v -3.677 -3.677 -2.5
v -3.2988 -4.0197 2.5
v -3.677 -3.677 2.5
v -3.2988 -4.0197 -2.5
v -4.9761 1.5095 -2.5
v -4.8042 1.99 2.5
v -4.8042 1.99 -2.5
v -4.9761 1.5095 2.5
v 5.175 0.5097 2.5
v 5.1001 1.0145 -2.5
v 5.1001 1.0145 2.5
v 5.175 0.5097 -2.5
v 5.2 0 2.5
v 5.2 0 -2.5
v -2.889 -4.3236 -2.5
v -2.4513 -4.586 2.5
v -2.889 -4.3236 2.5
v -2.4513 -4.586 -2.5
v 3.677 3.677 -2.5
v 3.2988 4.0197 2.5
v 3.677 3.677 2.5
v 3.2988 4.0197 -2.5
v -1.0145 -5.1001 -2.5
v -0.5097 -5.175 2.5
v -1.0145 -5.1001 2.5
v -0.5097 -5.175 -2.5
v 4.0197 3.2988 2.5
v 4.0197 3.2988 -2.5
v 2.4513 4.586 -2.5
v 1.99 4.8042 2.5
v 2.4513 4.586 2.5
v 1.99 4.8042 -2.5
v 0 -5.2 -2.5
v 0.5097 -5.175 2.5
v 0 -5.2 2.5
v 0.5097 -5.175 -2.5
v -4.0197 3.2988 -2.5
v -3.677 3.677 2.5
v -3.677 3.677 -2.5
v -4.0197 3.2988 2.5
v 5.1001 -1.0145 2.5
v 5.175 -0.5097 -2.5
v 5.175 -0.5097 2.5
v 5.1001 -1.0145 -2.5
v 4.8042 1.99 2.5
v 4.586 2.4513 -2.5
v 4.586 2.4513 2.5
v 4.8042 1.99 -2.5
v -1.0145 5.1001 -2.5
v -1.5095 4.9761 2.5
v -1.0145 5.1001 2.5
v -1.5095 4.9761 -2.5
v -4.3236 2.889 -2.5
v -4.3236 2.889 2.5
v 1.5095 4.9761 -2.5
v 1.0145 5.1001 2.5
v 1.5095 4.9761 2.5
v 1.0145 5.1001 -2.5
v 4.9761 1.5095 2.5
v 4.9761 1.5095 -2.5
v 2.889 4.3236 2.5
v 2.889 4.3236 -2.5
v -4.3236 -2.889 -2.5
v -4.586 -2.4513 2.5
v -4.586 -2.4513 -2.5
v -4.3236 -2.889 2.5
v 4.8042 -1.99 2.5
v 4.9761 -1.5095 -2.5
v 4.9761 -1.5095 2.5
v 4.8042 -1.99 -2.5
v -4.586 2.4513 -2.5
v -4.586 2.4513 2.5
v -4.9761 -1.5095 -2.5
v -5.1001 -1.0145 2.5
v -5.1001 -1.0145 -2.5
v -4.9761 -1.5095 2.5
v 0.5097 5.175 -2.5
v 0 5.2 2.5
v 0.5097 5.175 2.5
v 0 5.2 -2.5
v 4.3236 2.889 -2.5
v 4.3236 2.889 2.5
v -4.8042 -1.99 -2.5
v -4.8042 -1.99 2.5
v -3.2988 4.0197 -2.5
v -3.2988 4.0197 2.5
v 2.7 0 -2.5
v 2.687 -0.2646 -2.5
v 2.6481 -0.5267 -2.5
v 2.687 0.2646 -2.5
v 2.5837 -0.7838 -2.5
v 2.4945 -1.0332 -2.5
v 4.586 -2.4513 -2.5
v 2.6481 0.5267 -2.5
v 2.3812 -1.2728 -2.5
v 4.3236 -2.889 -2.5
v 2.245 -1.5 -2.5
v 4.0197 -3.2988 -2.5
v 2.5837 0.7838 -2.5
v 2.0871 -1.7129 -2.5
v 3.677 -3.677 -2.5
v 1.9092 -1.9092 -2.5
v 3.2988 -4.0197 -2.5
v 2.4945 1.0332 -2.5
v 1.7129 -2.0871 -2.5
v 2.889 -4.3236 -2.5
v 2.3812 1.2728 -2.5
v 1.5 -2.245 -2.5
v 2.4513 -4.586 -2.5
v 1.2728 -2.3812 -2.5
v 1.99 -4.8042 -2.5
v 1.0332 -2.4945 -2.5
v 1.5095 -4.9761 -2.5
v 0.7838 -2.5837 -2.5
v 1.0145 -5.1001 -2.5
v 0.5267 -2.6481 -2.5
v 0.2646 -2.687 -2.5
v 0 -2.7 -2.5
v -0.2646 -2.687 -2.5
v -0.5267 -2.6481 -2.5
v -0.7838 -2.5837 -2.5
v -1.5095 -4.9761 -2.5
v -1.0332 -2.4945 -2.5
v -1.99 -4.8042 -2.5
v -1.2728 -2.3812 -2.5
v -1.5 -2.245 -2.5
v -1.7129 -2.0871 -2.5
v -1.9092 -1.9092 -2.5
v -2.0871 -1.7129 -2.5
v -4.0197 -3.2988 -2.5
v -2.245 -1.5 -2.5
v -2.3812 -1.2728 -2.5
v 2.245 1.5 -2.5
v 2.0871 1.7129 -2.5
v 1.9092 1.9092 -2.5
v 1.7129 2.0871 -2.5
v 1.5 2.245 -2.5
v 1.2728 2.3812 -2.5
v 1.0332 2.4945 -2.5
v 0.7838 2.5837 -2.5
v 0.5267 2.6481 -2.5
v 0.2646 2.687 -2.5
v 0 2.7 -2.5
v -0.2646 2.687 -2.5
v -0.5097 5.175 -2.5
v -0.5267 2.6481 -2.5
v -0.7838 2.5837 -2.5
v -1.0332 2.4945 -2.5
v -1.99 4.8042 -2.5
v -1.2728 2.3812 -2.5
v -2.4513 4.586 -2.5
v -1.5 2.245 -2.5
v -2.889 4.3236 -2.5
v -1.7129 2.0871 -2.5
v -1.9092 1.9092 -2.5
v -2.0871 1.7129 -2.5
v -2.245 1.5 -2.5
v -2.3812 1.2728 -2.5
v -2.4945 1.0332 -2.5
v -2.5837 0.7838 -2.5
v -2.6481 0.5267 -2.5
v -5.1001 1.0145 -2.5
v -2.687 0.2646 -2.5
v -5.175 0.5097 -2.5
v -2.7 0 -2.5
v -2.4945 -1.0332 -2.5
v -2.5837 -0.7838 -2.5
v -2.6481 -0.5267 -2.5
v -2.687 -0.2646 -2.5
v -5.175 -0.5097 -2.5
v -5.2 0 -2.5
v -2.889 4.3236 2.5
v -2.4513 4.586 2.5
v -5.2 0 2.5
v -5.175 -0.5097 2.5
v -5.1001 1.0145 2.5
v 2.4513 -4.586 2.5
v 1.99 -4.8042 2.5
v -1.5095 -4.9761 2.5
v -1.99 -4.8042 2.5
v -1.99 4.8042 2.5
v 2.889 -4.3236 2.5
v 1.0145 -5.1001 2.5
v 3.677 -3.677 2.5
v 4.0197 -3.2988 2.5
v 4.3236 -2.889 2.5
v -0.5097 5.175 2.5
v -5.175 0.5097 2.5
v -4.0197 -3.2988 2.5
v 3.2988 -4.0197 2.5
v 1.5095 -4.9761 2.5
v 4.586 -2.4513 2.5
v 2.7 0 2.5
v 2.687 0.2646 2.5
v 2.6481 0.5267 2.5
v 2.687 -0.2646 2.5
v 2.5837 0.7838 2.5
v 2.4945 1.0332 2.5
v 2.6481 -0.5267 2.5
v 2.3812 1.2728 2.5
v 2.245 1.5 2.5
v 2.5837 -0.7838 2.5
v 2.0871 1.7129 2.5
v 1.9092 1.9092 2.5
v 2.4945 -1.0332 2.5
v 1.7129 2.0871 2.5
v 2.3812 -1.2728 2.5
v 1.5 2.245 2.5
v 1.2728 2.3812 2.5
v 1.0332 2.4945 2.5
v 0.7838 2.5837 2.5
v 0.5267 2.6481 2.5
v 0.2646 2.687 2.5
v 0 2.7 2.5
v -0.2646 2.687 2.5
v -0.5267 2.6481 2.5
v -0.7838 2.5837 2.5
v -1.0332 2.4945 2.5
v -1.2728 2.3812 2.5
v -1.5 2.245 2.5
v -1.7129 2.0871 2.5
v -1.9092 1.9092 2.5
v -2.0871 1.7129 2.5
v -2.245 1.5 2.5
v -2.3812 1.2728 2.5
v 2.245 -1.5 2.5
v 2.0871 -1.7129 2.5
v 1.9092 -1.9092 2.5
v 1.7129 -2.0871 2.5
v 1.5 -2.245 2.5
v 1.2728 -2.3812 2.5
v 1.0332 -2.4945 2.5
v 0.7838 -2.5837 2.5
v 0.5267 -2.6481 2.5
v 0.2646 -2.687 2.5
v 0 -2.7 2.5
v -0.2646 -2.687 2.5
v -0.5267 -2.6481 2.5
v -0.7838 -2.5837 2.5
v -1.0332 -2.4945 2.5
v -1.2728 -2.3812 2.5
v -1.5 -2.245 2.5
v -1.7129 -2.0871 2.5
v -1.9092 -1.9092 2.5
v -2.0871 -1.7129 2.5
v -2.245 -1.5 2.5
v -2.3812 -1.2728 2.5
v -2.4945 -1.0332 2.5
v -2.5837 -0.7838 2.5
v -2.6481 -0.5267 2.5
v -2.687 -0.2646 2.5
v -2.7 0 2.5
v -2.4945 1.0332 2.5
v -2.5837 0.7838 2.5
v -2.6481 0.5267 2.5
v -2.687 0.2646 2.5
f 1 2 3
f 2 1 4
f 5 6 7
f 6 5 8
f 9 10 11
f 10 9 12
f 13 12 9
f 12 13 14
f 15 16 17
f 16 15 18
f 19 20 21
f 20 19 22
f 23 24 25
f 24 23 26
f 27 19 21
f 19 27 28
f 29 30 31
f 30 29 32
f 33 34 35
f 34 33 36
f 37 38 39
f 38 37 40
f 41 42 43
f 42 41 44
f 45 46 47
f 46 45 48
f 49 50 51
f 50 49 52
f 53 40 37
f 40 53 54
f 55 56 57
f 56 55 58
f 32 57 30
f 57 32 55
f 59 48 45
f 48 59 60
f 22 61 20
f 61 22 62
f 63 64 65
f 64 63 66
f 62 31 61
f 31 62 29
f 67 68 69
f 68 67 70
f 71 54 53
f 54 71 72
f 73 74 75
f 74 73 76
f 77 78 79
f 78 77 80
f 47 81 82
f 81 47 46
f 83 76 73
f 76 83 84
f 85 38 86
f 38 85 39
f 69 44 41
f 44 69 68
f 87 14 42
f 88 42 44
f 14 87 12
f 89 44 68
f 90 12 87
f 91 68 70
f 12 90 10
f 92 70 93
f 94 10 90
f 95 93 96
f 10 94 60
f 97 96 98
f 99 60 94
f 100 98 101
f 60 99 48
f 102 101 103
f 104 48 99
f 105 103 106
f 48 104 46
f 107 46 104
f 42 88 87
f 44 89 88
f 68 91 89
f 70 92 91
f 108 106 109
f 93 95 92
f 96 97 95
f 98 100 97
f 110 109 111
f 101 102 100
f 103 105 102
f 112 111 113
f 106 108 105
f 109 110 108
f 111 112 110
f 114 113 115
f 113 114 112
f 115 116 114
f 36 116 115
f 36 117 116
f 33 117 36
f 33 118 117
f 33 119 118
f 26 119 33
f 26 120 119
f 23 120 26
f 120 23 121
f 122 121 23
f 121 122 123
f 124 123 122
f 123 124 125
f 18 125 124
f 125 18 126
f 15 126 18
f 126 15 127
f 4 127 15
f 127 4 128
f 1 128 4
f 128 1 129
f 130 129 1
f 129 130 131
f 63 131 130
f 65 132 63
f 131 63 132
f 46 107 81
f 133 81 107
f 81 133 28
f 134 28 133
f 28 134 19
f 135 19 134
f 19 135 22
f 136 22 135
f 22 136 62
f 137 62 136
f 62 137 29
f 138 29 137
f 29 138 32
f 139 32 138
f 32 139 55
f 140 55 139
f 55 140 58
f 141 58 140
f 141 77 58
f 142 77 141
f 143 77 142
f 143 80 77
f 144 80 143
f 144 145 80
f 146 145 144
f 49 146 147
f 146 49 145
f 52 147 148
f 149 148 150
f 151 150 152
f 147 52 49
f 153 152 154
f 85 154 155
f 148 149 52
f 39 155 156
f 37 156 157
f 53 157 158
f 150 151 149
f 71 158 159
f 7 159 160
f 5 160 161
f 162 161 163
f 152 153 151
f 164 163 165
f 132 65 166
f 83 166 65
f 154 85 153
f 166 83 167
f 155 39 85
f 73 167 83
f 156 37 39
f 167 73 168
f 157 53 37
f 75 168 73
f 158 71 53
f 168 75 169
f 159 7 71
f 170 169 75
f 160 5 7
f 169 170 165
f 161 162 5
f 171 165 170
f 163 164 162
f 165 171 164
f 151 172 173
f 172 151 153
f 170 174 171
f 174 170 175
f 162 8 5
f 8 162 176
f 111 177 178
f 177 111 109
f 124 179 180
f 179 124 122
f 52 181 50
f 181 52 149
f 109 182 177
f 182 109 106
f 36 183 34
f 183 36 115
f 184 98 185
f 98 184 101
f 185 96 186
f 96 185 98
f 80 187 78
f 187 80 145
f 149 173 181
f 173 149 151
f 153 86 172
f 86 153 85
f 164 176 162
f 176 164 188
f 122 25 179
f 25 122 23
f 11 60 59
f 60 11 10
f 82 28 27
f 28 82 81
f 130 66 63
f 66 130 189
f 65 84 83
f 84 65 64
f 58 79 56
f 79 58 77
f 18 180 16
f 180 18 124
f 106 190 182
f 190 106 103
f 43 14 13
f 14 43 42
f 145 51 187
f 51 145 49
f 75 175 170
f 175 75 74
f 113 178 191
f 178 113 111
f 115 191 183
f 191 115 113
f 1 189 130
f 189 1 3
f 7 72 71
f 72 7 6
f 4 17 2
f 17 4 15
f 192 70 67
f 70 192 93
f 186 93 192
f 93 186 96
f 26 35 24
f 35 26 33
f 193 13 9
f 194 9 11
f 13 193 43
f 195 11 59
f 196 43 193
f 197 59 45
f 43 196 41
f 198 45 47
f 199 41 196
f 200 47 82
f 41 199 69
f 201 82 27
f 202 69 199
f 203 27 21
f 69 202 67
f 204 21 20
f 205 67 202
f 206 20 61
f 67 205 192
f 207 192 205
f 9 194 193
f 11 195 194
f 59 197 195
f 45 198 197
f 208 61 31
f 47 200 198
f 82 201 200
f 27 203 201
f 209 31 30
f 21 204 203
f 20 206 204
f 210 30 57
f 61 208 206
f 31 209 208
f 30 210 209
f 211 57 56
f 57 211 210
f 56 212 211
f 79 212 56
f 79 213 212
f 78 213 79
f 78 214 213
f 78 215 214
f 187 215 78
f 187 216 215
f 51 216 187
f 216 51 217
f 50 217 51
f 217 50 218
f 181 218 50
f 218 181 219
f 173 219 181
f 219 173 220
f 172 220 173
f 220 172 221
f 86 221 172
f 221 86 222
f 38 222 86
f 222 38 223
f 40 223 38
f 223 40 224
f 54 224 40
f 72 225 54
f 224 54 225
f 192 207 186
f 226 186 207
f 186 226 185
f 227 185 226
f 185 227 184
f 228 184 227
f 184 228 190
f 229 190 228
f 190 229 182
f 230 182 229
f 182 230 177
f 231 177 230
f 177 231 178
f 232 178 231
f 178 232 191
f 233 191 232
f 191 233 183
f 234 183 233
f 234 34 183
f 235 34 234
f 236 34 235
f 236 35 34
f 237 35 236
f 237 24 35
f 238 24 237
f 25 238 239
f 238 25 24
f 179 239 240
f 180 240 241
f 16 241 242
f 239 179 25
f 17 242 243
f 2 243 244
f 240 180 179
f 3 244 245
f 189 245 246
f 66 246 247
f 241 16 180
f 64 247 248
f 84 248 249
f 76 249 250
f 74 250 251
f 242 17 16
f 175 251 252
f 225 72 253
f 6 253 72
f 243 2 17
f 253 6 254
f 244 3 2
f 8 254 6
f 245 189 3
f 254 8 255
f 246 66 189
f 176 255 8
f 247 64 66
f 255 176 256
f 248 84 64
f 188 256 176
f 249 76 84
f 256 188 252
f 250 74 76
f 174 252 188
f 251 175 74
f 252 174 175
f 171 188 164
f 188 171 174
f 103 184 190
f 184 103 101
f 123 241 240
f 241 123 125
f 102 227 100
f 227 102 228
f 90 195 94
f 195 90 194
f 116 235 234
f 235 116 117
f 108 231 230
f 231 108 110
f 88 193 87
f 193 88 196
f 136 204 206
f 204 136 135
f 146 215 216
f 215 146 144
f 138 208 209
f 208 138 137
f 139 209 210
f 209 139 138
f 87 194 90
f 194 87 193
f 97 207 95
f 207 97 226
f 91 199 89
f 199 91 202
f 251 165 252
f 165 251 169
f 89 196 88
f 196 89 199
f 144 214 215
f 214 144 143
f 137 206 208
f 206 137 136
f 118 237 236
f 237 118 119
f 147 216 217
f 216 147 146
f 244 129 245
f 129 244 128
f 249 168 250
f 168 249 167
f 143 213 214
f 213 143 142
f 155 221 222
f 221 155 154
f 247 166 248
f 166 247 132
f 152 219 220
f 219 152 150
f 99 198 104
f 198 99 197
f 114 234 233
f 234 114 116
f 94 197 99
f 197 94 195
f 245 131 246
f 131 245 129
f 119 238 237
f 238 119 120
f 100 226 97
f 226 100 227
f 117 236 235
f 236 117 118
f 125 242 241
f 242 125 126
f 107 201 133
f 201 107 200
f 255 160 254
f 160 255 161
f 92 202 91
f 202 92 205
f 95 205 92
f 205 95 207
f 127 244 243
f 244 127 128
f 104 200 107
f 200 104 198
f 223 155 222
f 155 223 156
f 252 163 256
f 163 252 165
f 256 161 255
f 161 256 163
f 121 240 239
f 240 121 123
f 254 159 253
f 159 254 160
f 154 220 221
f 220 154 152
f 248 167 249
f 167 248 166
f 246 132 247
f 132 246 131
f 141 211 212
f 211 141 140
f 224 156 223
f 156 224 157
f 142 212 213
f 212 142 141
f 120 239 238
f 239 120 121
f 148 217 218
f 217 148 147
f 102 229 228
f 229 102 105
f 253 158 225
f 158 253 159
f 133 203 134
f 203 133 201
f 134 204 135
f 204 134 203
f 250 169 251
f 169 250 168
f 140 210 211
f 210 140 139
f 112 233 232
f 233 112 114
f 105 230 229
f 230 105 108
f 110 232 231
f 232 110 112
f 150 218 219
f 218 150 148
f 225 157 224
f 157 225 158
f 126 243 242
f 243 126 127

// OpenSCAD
$fn = 64;

// instead of 
// bolt_diameter = 5;
// hole_diameter = 5; we do

bolt_diameter = 5;
clearance = 0.4;

hole_diameter = bolt_diameter + clearance;

thickness = 5;

difference(){
    cylinder(h = thickness, d = hole_diameter +5, center = true);
    
    cylinder(h = thickness + 2, d = hole_diameter, center = true);   
}
